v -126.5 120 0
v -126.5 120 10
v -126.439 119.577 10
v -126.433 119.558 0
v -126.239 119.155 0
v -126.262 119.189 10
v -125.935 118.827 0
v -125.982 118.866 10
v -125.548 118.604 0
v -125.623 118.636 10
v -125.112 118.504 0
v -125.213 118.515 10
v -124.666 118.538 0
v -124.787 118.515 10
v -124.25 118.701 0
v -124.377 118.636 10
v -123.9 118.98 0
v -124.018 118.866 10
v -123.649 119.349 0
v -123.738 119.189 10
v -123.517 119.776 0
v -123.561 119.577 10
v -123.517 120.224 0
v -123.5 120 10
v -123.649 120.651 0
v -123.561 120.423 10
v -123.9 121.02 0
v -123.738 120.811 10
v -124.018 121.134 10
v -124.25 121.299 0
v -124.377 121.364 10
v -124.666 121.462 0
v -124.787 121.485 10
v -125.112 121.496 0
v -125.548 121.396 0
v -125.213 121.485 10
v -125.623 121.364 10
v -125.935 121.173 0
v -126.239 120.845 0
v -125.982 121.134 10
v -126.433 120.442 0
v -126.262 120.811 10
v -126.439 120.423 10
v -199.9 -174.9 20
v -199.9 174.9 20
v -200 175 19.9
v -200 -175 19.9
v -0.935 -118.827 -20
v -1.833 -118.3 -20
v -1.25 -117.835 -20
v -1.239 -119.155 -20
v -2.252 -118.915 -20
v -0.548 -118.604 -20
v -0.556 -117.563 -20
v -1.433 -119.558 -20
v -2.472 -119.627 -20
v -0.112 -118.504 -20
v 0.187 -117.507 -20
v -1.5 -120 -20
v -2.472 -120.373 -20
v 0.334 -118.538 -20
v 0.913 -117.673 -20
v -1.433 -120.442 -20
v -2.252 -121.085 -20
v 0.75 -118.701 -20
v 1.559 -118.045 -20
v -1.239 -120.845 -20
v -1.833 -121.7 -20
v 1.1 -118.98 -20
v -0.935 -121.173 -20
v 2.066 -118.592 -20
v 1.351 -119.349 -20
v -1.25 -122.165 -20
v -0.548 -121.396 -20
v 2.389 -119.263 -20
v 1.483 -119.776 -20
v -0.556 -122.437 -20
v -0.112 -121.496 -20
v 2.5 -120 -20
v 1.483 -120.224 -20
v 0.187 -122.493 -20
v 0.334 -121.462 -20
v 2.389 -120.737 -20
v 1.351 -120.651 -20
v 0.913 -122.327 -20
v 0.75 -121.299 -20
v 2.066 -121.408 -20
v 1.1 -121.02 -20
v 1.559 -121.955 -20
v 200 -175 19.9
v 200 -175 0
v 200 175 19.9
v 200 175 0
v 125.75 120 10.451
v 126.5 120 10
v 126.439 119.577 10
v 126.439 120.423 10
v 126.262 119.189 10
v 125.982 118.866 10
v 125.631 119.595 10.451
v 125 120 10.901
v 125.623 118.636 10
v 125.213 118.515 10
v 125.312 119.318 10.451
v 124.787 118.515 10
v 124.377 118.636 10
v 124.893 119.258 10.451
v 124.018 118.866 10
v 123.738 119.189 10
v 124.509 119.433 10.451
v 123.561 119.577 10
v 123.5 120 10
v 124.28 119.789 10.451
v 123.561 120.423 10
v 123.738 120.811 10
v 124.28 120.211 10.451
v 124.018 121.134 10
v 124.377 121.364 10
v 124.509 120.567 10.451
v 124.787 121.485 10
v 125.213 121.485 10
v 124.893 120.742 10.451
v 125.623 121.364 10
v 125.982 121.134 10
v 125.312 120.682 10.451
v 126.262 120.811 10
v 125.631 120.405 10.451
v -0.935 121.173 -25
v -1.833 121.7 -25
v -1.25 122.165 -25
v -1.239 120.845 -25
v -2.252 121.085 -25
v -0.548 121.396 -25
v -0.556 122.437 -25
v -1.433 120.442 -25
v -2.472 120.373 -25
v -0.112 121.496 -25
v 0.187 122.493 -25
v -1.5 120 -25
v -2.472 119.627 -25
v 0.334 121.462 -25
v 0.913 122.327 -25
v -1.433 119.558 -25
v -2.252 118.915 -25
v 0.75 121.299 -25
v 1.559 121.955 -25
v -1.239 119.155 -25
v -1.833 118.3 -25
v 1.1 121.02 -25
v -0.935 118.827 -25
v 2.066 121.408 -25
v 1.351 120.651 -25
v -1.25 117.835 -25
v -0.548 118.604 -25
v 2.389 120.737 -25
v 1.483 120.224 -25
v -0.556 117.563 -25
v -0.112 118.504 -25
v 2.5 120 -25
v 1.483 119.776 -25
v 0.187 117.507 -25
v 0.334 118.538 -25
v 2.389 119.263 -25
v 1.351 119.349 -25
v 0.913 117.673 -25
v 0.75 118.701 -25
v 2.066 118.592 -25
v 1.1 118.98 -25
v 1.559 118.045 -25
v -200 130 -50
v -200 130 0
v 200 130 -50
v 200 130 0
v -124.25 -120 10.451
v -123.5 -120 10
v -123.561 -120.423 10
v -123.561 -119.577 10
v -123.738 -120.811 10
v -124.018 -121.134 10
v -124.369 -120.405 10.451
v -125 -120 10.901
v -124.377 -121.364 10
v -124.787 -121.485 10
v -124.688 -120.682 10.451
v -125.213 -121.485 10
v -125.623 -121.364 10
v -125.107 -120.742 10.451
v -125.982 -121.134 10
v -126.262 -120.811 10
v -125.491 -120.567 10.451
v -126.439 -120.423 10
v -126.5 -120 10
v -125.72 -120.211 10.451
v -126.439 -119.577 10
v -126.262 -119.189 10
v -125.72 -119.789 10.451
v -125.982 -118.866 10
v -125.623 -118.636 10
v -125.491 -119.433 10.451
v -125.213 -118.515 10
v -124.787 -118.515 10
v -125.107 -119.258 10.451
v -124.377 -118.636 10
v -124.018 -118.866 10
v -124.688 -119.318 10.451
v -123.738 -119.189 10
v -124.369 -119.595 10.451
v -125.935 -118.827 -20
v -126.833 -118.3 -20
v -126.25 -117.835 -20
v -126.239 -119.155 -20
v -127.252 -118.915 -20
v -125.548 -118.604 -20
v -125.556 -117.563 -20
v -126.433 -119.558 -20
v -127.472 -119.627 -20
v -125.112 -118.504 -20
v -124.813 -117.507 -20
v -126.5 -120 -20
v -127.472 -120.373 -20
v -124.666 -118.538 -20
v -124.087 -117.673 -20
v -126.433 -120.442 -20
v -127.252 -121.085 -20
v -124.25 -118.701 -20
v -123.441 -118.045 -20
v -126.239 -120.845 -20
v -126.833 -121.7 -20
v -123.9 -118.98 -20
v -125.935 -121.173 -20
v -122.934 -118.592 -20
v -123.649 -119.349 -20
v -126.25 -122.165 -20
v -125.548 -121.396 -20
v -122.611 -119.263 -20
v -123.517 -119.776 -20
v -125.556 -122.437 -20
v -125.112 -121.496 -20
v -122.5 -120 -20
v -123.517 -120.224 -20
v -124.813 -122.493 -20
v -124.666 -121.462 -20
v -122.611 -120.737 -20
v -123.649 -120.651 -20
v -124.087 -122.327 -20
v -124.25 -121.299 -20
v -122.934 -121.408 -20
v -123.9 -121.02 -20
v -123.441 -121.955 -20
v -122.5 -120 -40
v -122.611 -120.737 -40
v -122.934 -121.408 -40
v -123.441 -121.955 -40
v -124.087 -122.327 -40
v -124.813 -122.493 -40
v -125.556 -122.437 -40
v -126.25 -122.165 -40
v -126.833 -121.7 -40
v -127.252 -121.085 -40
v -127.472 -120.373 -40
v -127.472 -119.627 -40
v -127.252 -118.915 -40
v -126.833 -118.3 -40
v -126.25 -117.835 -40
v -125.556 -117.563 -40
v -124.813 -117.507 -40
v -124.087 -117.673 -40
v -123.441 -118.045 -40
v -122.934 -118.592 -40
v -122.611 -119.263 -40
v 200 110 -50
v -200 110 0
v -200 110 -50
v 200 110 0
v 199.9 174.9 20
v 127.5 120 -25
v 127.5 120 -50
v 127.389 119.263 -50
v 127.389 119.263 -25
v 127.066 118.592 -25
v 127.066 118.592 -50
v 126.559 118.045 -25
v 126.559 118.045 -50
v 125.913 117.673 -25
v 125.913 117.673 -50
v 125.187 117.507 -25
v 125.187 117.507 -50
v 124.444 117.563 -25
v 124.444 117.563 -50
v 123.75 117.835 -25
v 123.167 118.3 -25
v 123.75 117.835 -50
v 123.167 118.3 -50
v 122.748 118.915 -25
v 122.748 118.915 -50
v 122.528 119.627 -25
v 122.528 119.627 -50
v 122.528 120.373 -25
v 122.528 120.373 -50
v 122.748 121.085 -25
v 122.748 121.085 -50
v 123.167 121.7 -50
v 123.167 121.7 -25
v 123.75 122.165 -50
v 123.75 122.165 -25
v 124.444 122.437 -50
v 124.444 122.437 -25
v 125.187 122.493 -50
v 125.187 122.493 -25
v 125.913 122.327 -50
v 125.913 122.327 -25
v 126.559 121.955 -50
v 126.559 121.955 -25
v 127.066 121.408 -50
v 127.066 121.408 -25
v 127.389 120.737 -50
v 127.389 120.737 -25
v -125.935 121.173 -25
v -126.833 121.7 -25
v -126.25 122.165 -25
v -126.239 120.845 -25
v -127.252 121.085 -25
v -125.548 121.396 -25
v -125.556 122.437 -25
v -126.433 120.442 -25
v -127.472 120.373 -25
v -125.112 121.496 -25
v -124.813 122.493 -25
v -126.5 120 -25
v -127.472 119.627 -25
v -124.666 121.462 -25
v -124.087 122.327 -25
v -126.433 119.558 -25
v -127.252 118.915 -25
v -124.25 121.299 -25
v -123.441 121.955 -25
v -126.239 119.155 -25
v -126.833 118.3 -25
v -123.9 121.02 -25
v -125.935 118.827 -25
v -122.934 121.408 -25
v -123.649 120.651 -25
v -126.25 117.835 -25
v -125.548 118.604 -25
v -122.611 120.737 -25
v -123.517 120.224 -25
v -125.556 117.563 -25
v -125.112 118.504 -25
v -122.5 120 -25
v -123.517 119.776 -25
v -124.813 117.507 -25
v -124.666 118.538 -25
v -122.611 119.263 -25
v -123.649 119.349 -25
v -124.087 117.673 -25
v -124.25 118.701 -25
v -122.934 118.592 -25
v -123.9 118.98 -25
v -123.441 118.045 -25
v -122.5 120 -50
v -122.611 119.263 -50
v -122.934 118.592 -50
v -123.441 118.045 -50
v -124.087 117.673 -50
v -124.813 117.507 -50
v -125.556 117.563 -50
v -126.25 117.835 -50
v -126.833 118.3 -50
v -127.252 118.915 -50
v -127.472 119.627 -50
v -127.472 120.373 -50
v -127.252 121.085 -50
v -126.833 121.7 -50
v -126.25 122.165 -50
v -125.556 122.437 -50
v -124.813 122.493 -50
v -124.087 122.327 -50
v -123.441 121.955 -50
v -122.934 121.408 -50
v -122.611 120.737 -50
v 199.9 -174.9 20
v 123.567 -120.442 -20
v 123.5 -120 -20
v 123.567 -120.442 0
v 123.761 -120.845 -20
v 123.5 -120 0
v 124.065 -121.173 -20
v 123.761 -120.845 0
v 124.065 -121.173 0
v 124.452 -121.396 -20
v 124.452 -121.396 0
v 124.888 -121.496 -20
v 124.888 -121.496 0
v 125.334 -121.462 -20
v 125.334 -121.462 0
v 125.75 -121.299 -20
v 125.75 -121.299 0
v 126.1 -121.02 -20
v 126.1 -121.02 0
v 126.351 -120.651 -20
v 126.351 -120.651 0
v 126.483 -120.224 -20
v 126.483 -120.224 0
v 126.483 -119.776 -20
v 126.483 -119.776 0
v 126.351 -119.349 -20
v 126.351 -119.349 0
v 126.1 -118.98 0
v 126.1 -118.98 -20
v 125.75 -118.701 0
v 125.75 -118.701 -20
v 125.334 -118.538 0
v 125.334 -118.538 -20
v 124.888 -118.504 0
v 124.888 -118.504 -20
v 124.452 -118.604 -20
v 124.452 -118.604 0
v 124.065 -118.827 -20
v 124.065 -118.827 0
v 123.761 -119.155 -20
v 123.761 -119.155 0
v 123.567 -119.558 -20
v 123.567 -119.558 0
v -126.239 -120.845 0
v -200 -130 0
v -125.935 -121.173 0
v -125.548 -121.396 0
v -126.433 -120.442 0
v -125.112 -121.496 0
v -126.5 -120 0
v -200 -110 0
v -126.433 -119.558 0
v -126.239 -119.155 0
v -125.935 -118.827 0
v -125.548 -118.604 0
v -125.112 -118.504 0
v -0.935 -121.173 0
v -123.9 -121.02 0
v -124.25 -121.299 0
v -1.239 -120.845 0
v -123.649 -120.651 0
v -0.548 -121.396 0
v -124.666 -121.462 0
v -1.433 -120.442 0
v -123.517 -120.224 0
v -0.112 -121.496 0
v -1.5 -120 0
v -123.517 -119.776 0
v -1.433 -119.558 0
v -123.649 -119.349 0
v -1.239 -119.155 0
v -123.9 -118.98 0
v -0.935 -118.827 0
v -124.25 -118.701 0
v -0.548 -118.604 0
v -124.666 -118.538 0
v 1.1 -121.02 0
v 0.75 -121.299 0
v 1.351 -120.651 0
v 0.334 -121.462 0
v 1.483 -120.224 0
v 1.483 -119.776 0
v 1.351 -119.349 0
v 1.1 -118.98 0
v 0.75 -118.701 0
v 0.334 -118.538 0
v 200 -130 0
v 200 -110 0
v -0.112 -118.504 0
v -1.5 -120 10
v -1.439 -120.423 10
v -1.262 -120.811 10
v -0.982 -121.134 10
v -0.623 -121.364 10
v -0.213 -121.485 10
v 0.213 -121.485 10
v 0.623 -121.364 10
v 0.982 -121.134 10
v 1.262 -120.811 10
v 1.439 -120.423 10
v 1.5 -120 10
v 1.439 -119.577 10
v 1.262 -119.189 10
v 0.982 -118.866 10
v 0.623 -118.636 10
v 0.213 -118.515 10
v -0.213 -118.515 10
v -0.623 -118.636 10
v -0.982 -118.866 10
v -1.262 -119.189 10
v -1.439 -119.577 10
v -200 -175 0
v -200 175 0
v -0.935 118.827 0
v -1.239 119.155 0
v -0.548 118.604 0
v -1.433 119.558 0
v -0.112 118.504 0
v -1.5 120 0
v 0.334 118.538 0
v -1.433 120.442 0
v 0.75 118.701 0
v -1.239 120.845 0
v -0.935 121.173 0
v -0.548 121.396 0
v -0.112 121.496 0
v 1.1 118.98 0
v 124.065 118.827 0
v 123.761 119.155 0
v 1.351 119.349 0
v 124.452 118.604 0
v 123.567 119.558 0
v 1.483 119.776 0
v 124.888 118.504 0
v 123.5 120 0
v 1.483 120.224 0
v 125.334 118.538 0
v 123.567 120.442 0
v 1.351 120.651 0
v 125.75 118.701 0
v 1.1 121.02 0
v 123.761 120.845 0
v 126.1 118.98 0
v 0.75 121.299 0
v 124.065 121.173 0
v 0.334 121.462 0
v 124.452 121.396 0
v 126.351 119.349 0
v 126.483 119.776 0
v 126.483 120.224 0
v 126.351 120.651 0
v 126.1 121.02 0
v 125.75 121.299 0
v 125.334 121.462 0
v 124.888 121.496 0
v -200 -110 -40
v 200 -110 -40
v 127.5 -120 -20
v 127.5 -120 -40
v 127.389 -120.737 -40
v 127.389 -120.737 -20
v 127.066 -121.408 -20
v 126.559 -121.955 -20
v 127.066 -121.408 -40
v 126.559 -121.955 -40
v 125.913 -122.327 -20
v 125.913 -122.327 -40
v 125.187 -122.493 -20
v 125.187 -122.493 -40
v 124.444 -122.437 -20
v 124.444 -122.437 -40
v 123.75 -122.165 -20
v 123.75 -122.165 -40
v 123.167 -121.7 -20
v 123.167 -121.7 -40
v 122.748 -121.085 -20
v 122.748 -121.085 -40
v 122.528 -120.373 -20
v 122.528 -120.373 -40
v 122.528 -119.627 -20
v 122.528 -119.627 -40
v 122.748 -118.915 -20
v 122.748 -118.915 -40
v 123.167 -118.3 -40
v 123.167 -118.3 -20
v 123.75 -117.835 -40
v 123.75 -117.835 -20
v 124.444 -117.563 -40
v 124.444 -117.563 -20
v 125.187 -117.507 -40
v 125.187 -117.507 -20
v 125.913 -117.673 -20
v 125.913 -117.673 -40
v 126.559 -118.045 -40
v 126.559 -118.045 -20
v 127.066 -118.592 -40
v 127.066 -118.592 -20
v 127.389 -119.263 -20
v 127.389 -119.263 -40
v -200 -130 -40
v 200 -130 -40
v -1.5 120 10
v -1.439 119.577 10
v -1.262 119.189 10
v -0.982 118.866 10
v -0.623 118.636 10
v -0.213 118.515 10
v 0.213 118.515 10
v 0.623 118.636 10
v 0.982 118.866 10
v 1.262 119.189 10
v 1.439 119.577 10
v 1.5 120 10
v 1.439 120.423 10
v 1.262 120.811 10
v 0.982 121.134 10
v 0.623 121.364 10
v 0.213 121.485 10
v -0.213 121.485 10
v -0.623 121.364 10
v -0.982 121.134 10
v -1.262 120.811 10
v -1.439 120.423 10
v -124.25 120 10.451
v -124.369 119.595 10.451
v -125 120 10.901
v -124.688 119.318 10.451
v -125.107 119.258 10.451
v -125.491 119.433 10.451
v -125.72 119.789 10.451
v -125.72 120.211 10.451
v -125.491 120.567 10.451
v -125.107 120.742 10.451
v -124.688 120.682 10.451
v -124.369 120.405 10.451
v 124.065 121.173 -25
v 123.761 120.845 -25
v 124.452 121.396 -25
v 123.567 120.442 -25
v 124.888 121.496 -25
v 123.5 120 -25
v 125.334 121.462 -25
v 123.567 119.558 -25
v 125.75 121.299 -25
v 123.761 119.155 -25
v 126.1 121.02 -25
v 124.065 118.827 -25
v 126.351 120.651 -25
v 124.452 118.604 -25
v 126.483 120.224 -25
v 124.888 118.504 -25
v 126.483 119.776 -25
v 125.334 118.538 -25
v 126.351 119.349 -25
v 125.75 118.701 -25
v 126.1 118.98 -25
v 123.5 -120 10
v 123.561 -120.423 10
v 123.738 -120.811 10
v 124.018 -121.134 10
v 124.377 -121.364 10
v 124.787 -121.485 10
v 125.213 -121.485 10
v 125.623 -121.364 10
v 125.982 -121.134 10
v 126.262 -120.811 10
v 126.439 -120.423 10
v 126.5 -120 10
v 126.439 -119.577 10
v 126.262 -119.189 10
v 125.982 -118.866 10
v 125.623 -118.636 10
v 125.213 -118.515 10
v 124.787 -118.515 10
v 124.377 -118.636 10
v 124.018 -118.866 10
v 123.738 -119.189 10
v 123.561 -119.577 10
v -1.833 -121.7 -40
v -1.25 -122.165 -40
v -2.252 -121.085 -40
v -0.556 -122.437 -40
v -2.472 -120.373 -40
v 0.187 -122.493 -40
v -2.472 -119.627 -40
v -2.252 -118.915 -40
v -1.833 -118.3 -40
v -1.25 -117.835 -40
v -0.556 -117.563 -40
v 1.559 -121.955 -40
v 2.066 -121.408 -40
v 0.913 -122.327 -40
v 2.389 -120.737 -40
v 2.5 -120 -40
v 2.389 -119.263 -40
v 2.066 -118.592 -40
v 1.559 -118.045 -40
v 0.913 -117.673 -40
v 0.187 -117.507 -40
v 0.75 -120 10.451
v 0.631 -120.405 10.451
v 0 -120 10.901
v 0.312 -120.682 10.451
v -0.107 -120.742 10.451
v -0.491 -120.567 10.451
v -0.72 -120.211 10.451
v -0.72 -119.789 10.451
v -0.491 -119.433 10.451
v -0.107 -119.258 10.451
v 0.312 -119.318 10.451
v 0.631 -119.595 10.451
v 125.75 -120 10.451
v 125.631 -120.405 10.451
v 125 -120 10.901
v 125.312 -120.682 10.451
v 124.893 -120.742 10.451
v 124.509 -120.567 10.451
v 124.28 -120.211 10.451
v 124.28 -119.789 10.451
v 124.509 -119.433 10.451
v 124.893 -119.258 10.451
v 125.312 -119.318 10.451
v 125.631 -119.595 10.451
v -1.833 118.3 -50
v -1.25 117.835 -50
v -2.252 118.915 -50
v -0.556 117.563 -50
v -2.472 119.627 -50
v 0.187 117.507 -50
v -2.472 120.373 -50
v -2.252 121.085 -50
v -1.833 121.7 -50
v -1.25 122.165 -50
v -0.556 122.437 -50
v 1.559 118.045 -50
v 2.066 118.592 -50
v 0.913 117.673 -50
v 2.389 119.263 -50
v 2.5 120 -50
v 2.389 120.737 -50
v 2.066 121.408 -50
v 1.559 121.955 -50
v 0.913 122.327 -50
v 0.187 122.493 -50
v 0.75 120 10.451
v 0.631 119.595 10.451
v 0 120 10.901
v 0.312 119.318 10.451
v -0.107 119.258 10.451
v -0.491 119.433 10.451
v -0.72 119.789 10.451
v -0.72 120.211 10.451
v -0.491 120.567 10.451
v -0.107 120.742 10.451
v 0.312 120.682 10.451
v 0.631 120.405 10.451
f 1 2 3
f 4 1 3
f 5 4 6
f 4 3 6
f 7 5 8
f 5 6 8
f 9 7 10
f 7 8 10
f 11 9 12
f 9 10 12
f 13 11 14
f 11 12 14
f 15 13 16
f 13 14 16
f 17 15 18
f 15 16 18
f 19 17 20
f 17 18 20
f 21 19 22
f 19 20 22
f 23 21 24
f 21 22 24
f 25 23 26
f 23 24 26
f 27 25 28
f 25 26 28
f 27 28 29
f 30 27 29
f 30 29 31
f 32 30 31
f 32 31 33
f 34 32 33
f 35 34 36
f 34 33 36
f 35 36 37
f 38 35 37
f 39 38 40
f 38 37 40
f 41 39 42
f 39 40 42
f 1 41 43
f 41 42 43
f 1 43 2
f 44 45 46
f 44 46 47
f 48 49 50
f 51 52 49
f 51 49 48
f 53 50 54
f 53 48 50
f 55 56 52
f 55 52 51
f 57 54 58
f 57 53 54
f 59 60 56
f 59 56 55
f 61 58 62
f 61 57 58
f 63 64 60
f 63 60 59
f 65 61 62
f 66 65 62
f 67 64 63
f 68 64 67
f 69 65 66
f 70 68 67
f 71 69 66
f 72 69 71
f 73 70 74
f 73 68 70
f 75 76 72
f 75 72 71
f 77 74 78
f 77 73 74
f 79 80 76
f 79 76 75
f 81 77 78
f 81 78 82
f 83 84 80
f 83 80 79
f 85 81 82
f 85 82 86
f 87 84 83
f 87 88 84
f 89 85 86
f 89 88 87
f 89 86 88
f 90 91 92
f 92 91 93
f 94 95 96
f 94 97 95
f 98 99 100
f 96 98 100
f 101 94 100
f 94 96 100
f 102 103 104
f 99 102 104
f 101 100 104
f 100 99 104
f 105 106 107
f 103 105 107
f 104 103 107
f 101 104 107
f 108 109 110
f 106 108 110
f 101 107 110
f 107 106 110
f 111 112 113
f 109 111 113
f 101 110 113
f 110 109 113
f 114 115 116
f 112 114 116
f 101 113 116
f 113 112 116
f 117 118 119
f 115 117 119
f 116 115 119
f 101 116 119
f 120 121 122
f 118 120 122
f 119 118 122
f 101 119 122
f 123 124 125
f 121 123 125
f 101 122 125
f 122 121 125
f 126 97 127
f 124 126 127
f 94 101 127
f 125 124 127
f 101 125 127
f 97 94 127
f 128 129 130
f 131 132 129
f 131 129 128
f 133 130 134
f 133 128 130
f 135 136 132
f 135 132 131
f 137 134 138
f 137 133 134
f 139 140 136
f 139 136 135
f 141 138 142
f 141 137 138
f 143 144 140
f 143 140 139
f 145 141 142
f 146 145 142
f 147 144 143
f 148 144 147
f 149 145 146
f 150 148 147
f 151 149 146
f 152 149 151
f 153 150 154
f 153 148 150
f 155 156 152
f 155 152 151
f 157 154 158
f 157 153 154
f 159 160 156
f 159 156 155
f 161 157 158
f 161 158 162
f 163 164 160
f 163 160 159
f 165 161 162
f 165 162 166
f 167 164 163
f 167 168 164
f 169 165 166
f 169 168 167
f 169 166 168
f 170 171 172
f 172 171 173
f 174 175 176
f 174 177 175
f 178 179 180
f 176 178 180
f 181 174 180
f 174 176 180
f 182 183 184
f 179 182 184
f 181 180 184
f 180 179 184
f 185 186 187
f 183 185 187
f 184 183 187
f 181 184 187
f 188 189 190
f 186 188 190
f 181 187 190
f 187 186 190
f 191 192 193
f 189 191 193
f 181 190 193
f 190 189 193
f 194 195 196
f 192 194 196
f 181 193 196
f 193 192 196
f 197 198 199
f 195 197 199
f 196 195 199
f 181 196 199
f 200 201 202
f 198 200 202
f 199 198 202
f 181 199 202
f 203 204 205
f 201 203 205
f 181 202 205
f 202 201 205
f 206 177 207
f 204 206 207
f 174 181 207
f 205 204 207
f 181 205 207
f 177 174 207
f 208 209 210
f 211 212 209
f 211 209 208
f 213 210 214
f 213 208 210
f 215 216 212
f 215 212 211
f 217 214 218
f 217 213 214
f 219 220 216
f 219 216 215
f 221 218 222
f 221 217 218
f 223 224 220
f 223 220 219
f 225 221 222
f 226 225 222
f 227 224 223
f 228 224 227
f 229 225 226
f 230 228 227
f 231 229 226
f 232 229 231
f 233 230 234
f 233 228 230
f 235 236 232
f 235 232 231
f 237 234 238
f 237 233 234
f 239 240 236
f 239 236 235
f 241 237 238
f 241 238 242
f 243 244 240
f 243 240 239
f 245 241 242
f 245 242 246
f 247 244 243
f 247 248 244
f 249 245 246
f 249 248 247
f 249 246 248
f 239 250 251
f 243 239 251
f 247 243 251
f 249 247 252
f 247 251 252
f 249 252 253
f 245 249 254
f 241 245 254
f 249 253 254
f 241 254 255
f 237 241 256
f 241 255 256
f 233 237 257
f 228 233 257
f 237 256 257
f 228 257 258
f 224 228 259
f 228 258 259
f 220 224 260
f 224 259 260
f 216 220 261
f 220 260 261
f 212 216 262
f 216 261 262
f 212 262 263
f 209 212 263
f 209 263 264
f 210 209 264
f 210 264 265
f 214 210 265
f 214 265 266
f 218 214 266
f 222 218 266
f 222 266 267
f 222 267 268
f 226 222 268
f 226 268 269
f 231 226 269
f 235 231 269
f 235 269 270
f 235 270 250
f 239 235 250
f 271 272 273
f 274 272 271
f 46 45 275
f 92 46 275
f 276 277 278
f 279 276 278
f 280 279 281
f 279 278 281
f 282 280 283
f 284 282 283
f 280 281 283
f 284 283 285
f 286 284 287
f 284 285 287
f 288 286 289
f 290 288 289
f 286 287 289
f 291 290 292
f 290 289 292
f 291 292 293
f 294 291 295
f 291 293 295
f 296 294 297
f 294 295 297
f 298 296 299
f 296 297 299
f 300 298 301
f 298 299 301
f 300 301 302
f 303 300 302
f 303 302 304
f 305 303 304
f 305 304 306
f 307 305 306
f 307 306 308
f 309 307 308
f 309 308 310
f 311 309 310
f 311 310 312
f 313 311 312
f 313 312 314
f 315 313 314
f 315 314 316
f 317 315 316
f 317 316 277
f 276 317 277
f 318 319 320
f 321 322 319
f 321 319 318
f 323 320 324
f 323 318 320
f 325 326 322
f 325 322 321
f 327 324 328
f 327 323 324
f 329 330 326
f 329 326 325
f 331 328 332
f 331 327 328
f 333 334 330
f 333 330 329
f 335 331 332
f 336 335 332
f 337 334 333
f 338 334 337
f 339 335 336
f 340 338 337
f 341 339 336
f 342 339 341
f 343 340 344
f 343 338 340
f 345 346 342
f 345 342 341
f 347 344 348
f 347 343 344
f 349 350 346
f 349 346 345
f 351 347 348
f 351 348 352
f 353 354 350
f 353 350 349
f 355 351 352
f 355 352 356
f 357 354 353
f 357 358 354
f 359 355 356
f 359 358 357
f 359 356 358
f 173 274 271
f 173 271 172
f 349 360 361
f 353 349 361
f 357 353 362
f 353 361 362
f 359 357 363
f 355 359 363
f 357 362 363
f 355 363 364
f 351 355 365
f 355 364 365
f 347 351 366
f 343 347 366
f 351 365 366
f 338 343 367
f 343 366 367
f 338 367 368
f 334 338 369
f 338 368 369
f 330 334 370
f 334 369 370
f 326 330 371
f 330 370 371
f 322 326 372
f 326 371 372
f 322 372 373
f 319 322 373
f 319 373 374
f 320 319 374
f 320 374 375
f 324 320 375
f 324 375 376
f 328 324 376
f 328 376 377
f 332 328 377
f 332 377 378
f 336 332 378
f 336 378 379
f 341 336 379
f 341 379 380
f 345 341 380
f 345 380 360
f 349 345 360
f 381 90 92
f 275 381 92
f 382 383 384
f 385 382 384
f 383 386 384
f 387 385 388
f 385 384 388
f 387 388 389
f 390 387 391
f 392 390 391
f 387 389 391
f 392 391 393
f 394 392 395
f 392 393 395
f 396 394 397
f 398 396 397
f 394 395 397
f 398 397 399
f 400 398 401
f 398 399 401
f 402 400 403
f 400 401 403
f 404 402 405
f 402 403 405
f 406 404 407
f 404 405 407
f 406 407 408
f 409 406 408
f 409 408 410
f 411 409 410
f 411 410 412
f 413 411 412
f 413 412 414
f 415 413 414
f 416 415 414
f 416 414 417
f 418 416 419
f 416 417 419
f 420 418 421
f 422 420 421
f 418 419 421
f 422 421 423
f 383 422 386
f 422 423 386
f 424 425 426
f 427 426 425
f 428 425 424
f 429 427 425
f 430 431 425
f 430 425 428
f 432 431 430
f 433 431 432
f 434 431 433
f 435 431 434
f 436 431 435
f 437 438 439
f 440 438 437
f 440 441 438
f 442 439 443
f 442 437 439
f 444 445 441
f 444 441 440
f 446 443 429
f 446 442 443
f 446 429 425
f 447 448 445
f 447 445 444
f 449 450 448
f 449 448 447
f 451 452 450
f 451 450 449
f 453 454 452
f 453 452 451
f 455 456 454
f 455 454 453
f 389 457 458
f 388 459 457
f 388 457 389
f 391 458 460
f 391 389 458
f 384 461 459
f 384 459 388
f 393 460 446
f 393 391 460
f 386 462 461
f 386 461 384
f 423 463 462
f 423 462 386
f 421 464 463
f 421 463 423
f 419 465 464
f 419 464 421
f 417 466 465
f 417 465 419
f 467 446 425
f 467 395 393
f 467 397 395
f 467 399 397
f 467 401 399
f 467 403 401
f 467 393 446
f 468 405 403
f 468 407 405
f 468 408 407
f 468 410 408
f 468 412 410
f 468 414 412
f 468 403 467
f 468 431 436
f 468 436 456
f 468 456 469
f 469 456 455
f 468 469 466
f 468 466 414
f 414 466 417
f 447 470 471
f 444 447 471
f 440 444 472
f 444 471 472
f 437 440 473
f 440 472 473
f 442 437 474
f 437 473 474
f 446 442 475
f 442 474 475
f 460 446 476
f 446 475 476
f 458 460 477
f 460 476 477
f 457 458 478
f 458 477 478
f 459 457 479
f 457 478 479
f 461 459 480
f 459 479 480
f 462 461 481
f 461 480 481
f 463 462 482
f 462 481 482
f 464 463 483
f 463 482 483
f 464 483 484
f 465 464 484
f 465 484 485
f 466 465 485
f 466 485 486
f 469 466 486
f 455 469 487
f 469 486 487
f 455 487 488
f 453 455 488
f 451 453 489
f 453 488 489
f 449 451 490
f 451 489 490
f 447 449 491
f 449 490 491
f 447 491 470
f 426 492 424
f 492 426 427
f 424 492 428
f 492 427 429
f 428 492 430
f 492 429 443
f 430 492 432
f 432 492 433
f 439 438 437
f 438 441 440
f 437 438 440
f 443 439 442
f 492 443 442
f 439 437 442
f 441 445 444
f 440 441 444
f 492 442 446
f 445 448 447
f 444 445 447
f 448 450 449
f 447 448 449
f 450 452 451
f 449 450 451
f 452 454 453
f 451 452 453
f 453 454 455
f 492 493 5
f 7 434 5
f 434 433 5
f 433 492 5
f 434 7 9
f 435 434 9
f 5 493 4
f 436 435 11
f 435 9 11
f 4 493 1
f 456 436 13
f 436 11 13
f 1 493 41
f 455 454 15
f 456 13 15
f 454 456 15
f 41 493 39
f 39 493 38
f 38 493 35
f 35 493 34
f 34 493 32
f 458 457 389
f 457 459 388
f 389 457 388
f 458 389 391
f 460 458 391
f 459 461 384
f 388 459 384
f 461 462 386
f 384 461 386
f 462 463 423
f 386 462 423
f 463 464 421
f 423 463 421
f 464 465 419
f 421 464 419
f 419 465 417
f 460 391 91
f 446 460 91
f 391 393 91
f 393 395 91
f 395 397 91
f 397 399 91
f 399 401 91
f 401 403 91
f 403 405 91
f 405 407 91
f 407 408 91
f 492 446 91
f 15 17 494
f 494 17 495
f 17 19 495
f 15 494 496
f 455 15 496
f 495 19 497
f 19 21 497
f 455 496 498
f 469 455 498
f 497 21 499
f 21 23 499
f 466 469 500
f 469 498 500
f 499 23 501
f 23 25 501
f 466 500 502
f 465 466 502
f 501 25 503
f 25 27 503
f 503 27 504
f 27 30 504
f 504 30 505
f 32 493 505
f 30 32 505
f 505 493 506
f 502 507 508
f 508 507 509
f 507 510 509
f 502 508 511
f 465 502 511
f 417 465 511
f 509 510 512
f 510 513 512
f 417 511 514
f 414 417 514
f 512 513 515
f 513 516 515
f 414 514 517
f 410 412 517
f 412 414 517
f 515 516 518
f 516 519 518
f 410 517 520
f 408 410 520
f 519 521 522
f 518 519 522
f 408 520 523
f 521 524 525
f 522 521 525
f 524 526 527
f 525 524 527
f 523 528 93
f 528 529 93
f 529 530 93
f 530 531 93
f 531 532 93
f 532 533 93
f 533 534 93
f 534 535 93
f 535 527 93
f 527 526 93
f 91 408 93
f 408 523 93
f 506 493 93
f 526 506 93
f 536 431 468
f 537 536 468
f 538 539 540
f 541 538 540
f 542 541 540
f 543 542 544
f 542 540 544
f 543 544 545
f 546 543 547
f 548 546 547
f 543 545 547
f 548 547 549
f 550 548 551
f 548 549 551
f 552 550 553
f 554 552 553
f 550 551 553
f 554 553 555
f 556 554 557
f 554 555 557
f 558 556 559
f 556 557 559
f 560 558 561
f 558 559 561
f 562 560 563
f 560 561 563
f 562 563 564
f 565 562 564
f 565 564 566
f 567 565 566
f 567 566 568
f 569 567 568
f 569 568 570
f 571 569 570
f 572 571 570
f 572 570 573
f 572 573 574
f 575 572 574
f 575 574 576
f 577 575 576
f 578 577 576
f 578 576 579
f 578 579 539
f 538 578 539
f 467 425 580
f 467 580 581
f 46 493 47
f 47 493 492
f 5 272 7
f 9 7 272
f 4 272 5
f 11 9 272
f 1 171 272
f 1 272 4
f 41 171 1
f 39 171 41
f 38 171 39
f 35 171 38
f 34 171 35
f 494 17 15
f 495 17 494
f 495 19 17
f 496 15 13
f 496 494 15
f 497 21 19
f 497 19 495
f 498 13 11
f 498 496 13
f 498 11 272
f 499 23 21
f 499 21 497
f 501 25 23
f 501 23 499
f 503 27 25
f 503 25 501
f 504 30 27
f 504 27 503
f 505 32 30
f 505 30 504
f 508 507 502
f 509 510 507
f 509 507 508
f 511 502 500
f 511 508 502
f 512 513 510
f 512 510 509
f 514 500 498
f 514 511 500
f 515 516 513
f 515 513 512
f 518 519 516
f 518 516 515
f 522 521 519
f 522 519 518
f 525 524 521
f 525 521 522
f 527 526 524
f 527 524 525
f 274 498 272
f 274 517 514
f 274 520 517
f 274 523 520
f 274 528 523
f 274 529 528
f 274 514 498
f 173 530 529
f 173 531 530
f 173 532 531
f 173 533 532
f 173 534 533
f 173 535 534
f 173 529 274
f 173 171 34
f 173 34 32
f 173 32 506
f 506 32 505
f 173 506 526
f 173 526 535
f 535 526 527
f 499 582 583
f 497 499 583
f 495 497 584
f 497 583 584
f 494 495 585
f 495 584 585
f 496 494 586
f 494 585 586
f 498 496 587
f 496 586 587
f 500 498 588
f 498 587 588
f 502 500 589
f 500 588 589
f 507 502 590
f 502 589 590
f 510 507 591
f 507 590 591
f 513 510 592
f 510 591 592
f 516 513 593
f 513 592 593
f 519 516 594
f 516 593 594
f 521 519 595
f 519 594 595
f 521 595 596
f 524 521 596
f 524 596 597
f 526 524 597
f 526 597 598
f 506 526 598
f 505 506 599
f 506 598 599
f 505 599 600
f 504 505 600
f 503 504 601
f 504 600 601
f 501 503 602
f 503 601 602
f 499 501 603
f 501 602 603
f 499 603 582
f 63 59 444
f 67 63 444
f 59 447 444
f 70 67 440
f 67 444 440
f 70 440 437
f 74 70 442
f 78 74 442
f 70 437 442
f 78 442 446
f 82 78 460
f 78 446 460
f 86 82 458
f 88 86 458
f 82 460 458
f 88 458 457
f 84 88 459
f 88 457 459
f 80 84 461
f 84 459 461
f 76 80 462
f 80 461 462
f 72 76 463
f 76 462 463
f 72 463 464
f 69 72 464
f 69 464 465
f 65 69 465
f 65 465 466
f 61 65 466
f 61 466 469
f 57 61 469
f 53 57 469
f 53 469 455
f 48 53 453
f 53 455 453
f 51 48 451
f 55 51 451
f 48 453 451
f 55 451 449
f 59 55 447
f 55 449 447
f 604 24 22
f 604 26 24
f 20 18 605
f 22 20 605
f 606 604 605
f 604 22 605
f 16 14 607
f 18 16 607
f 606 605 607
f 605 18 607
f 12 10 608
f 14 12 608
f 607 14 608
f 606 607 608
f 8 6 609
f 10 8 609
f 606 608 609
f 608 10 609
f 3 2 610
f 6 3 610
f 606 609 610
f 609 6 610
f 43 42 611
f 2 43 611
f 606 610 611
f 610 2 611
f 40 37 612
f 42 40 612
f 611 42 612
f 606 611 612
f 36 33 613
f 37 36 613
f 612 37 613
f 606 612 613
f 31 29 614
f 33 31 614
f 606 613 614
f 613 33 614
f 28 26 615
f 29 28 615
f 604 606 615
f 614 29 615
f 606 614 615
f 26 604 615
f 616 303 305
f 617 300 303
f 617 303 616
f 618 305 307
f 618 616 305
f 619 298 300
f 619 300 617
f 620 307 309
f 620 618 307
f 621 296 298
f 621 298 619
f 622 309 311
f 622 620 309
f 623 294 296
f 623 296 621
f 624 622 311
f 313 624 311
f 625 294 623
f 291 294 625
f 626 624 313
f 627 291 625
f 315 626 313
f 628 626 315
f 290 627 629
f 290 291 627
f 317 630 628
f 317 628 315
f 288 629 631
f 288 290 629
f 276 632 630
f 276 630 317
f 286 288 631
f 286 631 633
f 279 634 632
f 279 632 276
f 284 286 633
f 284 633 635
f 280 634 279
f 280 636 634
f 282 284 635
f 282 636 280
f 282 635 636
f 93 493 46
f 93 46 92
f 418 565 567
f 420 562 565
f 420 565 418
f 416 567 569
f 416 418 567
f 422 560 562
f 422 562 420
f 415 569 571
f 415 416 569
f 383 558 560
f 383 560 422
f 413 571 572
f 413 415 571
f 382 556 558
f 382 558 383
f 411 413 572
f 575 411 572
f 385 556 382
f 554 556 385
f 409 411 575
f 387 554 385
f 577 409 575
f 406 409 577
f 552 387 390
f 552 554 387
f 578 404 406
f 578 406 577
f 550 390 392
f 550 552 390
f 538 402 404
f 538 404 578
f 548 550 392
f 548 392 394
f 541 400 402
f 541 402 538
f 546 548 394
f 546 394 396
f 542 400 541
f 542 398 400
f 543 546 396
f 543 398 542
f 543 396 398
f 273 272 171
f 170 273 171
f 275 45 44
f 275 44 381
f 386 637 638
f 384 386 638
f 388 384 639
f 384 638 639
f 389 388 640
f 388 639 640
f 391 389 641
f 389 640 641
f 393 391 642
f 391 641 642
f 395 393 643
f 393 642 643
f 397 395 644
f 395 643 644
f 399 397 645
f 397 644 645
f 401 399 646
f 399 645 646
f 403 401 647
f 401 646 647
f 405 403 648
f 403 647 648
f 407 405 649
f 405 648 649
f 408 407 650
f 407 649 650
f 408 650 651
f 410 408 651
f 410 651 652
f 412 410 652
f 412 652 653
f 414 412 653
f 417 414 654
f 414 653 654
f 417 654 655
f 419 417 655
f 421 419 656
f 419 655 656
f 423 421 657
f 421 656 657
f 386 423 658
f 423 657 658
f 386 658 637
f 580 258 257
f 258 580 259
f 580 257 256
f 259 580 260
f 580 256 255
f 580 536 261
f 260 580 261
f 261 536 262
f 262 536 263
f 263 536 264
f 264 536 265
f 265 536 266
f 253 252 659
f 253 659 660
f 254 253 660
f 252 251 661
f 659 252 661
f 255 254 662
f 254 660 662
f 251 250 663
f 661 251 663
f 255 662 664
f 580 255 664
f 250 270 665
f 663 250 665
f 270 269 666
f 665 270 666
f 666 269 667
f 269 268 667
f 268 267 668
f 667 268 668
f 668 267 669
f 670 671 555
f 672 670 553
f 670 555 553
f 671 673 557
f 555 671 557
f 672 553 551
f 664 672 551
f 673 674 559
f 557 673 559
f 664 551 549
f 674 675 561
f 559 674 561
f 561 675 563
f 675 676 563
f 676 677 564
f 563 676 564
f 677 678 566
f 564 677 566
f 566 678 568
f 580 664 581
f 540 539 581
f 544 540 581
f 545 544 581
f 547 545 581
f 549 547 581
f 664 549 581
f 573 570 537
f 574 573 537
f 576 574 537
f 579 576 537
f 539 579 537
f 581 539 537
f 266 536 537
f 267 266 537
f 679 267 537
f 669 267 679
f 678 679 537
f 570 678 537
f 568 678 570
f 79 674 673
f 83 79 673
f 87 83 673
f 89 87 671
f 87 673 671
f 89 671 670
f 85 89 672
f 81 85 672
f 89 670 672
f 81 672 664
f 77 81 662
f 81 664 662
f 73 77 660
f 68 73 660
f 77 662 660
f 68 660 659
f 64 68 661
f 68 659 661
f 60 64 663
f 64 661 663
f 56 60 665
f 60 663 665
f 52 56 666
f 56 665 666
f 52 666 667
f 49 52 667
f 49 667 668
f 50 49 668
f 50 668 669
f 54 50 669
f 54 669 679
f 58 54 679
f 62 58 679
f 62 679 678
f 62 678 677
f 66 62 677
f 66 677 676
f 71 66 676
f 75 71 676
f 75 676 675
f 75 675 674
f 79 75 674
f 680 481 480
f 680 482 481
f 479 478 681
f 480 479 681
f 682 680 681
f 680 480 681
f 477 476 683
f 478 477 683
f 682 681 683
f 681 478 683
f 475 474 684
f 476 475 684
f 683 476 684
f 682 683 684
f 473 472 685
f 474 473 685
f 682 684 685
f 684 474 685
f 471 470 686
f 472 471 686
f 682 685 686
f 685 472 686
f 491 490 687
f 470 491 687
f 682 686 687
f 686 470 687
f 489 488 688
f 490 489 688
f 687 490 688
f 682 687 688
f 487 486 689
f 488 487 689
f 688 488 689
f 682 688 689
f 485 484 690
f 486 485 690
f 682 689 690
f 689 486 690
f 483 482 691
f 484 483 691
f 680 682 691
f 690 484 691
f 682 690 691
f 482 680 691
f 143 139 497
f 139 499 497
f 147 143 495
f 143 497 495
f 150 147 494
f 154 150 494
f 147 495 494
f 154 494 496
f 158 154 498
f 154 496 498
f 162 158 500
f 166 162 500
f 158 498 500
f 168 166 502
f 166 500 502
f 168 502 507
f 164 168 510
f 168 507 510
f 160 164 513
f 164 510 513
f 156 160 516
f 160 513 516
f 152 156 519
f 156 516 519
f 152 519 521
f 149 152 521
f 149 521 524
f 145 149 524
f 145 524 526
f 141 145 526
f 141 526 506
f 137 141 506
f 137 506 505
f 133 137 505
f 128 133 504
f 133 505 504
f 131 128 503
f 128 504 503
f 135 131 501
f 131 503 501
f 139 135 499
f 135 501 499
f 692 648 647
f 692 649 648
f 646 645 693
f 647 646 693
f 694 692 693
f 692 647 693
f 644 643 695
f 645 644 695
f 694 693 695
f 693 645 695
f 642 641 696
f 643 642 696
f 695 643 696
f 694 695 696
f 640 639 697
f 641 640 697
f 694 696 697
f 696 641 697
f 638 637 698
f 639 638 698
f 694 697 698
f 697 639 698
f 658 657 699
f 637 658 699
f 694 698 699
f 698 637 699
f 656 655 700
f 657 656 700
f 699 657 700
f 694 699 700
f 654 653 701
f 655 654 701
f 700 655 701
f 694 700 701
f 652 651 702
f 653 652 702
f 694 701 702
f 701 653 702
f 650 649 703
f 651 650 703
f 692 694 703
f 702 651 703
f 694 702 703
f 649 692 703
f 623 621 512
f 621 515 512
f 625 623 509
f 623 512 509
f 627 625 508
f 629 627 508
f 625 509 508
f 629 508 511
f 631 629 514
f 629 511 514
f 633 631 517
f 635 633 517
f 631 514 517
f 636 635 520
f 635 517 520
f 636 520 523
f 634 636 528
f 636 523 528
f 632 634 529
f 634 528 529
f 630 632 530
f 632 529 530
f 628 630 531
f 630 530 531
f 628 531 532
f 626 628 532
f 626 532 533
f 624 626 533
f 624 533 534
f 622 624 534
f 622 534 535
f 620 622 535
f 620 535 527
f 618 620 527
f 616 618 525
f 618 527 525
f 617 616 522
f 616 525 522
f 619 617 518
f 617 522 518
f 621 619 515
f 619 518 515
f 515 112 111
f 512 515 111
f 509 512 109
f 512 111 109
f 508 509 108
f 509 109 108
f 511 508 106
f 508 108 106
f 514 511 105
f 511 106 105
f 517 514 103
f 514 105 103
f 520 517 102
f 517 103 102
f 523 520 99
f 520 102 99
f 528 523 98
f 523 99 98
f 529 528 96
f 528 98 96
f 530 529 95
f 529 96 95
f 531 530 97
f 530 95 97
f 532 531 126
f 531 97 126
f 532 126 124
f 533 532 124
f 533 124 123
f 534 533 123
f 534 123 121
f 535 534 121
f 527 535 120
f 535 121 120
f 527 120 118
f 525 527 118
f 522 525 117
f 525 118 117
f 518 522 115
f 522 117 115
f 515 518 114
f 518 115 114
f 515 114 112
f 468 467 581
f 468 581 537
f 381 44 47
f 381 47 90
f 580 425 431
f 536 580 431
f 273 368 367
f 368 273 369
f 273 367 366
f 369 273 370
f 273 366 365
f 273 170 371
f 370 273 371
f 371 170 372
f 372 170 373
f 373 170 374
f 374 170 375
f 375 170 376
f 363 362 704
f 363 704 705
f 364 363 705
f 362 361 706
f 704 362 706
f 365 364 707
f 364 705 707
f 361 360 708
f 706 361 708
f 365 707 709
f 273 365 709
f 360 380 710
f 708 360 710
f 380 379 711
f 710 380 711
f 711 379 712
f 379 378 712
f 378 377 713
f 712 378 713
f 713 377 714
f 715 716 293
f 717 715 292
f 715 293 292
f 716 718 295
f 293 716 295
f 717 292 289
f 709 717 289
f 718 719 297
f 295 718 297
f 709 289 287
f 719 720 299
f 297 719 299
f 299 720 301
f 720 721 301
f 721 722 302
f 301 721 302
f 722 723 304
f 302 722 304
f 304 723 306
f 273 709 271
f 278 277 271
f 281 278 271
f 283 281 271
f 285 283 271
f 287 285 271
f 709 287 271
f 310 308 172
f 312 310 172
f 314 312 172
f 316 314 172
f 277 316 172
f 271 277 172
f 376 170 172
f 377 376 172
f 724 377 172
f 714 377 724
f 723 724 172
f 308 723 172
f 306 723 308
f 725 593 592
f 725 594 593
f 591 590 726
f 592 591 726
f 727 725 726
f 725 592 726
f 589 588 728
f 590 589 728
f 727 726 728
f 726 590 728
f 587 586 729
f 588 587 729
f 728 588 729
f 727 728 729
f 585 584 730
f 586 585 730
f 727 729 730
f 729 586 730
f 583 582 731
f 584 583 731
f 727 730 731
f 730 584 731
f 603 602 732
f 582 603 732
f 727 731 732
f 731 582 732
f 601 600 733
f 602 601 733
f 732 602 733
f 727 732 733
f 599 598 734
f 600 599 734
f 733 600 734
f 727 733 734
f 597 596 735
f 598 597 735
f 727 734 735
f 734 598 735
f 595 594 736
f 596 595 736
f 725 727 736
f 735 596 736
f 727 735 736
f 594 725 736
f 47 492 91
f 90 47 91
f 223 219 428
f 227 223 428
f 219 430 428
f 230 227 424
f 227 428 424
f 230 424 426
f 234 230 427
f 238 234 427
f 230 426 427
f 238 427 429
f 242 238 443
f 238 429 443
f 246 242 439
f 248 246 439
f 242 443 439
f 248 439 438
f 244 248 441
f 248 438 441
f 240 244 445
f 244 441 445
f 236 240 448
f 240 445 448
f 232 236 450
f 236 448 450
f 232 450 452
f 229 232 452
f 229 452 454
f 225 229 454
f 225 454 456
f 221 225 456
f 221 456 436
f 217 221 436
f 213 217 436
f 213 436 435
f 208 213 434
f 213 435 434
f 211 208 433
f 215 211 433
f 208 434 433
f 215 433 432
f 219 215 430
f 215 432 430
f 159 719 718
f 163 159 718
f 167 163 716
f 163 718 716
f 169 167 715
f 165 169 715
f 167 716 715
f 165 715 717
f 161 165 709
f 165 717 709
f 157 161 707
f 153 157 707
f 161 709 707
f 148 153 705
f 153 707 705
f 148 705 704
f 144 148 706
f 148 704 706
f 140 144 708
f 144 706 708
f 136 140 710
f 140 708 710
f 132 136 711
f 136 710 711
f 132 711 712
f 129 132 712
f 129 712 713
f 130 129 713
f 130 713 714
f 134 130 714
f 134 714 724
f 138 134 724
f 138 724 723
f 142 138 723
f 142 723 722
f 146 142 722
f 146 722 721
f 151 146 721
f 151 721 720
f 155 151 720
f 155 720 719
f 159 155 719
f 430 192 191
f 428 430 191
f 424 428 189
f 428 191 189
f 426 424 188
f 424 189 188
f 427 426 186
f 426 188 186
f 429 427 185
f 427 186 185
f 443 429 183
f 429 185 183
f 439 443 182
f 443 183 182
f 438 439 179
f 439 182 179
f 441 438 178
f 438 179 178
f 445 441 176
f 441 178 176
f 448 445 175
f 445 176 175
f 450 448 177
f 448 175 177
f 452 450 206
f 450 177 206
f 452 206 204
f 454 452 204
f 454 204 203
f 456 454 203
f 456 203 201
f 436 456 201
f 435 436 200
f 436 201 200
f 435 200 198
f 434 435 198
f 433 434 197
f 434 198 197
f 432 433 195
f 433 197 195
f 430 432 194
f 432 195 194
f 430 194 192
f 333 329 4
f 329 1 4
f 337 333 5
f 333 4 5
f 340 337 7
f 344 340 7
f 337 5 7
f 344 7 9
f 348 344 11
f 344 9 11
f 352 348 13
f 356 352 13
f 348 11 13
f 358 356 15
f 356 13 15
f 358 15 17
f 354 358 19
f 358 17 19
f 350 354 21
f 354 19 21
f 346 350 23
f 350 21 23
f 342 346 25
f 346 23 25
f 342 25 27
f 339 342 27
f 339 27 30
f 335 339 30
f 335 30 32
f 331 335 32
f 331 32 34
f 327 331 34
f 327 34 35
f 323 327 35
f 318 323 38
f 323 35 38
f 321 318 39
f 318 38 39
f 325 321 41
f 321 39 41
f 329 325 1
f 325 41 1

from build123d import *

# Parameters (mm, degrees)
F0_W             = 400
F0_H             = 45
F0_H_2           = 20
F0_H_3           = 220
F1_DEPTH         = 20
F2_DEPTH         = 40
F3_DEPTH         = 50
F6_D             = 3
F6_DEPTH         = 50
F6_CBORE_D       = 5
F6_CBORE_DEPTH   = 20
F6_TIP           = 0.9012909285
F6_2_D           = 3
F6_2_DEPTH       = 50
F6_2_CBORE_D     = 5
F6_2_CBORE_DEPTH = 20
F6_2_TIP         = 0.9012909285
F9_D             = 3
F9_DEPTH         = 60
F9_CBORE_D       = 5
F9_CBORE_DEPTH   = 25
F9_TIP           = 0.9012909285
F9_2_D           = 3
F9_2_DEPTH       = 60
F9_2_CBORE_D     = 5
F9_2_CBORE_DEPTH = 25
F9_2_TIP         = 0.9012909285
F10_SIZE         = 0.1


with BuildPart() as f1:
    # F0 (on Top) → F1 (new body)
    with BuildSketch(Plane.XY):
        with Locations((0, 152.5)):
            Rectangle(F0_W, F0_H)
        with Locations((0, 120)):
            Rectangle(F0_W, F0_H_2)
        Rectangle(F0_W, F0_H_3)
        with Locations((0, -120)):
            Rectangle(F0_W, F0_H_2)
        with Locations((0, -152.5)):
            Rectangle(F0_W, F0_H)
    extrude(amount=F1_DEPTH)

    # F6
    with Locations(Plane(origin=(0, 0, -40), x_dir=(1, 0, 0), z_dir=(0, 0, -1))):
        with Locations((-125, 120), (0, 120), (125, 120)):
            CounterBoreHole(F6_D / 2, F6_CBORE_D / 2, F6_CBORE_DEPTH, depth=F6_DEPTH)
            with Locations((0, 0, -(F6_DEPTH + F6_TIP / 2))):  # 118° drill point
                Cone(0, F6_D / 2, F6_TIP, mode=Mode.SUBTRACT)

    # F9
    with Locations(Plane(origin=(0, 0, -50), x_dir=(1, 0, 0), z_dir=(0, 0, -1))):
        with Locations((125, -120), (0, -120), (-125, -120)):
            CounterBoreHole(F9_D / 2, F9_CBORE_D / 2, F9_CBORE_DEPTH, depth=F9_DEPTH)
            with Locations((0, 0, -(F9_DEPTH + F9_TIP / 2))):  # 118° drill point
                Cone(0, F9_D / 2, F9_TIP, mode=Mode.SUBTRACT)

    # F10
    f10_edges = [f1.edges().sort_by_distance(p)[0] for p in [
        (-200, 0, 20),
        (0, -175, 20),
        (200, 0, 20),
        (0, 175, 20),
    ]]
    chamfer(f10_edges, length=F10_SIZE)


with BuildPart() as f2:
    # F0 (on Top) → F2 (new body)
    with BuildSketch(Plane.XY):
        with Locations((0, -120)):
            Rectangle(F0_W, F0_H_2)
    extrude(amount=-F2_DEPTH)

    # F6#2
    with Locations(Plane(origin=(0, 0, -40), x_dir=(1, 0, 0), z_dir=(0, 0, -1))):
        with Locations((-125, 120), (0, 120), (125, 120)):
            CounterBoreHole(F6_2_D / 2, F6_2_CBORE_D / 2, F6_2_CBORE_DEPTH, depth=F6_2_DEPTH)
            with Locations((0, 0, -(F6_2_DEPTH + F6_2_TIP / 2))):  # 118° drill point
                Cone(0, F6_2_D / 2, F6_2_TIP, mode=Mode.SUBTRACT)


with BuildPart() as f3:
    # F0 (on Top) → F3 (new body)
    with BuildSketch(Plane.XY):
        with Locations((0, 120)):
            Rectangle(F0_W, F0_H_2)
    extrude(amount=-F3_DEPTH)

    # F9#2
    with Locations(Plane(origin=(0, 0, -50), x_dir=(1, 0, 0), z_dir=(0, 0, -1))):
        with Locations((125, -120), (0, -120), (-125, -120)):
            CounterBoreHole(F9_2_D / 2, F9_2_CBORE_D / 2, F9_2_CBORE_DEPTH, depth=F9_2_DEPTH)
            with Locations((0, 0, -(F9_2_DEPTH + F9_2_TIP / 2))):  # 118° drill point
                Cone(0, F9_2_D / 2, F9_2_TIP, mode=Mode.SUBTRACT)


solid = Compound([f1.part, f2.part, f3.part])
